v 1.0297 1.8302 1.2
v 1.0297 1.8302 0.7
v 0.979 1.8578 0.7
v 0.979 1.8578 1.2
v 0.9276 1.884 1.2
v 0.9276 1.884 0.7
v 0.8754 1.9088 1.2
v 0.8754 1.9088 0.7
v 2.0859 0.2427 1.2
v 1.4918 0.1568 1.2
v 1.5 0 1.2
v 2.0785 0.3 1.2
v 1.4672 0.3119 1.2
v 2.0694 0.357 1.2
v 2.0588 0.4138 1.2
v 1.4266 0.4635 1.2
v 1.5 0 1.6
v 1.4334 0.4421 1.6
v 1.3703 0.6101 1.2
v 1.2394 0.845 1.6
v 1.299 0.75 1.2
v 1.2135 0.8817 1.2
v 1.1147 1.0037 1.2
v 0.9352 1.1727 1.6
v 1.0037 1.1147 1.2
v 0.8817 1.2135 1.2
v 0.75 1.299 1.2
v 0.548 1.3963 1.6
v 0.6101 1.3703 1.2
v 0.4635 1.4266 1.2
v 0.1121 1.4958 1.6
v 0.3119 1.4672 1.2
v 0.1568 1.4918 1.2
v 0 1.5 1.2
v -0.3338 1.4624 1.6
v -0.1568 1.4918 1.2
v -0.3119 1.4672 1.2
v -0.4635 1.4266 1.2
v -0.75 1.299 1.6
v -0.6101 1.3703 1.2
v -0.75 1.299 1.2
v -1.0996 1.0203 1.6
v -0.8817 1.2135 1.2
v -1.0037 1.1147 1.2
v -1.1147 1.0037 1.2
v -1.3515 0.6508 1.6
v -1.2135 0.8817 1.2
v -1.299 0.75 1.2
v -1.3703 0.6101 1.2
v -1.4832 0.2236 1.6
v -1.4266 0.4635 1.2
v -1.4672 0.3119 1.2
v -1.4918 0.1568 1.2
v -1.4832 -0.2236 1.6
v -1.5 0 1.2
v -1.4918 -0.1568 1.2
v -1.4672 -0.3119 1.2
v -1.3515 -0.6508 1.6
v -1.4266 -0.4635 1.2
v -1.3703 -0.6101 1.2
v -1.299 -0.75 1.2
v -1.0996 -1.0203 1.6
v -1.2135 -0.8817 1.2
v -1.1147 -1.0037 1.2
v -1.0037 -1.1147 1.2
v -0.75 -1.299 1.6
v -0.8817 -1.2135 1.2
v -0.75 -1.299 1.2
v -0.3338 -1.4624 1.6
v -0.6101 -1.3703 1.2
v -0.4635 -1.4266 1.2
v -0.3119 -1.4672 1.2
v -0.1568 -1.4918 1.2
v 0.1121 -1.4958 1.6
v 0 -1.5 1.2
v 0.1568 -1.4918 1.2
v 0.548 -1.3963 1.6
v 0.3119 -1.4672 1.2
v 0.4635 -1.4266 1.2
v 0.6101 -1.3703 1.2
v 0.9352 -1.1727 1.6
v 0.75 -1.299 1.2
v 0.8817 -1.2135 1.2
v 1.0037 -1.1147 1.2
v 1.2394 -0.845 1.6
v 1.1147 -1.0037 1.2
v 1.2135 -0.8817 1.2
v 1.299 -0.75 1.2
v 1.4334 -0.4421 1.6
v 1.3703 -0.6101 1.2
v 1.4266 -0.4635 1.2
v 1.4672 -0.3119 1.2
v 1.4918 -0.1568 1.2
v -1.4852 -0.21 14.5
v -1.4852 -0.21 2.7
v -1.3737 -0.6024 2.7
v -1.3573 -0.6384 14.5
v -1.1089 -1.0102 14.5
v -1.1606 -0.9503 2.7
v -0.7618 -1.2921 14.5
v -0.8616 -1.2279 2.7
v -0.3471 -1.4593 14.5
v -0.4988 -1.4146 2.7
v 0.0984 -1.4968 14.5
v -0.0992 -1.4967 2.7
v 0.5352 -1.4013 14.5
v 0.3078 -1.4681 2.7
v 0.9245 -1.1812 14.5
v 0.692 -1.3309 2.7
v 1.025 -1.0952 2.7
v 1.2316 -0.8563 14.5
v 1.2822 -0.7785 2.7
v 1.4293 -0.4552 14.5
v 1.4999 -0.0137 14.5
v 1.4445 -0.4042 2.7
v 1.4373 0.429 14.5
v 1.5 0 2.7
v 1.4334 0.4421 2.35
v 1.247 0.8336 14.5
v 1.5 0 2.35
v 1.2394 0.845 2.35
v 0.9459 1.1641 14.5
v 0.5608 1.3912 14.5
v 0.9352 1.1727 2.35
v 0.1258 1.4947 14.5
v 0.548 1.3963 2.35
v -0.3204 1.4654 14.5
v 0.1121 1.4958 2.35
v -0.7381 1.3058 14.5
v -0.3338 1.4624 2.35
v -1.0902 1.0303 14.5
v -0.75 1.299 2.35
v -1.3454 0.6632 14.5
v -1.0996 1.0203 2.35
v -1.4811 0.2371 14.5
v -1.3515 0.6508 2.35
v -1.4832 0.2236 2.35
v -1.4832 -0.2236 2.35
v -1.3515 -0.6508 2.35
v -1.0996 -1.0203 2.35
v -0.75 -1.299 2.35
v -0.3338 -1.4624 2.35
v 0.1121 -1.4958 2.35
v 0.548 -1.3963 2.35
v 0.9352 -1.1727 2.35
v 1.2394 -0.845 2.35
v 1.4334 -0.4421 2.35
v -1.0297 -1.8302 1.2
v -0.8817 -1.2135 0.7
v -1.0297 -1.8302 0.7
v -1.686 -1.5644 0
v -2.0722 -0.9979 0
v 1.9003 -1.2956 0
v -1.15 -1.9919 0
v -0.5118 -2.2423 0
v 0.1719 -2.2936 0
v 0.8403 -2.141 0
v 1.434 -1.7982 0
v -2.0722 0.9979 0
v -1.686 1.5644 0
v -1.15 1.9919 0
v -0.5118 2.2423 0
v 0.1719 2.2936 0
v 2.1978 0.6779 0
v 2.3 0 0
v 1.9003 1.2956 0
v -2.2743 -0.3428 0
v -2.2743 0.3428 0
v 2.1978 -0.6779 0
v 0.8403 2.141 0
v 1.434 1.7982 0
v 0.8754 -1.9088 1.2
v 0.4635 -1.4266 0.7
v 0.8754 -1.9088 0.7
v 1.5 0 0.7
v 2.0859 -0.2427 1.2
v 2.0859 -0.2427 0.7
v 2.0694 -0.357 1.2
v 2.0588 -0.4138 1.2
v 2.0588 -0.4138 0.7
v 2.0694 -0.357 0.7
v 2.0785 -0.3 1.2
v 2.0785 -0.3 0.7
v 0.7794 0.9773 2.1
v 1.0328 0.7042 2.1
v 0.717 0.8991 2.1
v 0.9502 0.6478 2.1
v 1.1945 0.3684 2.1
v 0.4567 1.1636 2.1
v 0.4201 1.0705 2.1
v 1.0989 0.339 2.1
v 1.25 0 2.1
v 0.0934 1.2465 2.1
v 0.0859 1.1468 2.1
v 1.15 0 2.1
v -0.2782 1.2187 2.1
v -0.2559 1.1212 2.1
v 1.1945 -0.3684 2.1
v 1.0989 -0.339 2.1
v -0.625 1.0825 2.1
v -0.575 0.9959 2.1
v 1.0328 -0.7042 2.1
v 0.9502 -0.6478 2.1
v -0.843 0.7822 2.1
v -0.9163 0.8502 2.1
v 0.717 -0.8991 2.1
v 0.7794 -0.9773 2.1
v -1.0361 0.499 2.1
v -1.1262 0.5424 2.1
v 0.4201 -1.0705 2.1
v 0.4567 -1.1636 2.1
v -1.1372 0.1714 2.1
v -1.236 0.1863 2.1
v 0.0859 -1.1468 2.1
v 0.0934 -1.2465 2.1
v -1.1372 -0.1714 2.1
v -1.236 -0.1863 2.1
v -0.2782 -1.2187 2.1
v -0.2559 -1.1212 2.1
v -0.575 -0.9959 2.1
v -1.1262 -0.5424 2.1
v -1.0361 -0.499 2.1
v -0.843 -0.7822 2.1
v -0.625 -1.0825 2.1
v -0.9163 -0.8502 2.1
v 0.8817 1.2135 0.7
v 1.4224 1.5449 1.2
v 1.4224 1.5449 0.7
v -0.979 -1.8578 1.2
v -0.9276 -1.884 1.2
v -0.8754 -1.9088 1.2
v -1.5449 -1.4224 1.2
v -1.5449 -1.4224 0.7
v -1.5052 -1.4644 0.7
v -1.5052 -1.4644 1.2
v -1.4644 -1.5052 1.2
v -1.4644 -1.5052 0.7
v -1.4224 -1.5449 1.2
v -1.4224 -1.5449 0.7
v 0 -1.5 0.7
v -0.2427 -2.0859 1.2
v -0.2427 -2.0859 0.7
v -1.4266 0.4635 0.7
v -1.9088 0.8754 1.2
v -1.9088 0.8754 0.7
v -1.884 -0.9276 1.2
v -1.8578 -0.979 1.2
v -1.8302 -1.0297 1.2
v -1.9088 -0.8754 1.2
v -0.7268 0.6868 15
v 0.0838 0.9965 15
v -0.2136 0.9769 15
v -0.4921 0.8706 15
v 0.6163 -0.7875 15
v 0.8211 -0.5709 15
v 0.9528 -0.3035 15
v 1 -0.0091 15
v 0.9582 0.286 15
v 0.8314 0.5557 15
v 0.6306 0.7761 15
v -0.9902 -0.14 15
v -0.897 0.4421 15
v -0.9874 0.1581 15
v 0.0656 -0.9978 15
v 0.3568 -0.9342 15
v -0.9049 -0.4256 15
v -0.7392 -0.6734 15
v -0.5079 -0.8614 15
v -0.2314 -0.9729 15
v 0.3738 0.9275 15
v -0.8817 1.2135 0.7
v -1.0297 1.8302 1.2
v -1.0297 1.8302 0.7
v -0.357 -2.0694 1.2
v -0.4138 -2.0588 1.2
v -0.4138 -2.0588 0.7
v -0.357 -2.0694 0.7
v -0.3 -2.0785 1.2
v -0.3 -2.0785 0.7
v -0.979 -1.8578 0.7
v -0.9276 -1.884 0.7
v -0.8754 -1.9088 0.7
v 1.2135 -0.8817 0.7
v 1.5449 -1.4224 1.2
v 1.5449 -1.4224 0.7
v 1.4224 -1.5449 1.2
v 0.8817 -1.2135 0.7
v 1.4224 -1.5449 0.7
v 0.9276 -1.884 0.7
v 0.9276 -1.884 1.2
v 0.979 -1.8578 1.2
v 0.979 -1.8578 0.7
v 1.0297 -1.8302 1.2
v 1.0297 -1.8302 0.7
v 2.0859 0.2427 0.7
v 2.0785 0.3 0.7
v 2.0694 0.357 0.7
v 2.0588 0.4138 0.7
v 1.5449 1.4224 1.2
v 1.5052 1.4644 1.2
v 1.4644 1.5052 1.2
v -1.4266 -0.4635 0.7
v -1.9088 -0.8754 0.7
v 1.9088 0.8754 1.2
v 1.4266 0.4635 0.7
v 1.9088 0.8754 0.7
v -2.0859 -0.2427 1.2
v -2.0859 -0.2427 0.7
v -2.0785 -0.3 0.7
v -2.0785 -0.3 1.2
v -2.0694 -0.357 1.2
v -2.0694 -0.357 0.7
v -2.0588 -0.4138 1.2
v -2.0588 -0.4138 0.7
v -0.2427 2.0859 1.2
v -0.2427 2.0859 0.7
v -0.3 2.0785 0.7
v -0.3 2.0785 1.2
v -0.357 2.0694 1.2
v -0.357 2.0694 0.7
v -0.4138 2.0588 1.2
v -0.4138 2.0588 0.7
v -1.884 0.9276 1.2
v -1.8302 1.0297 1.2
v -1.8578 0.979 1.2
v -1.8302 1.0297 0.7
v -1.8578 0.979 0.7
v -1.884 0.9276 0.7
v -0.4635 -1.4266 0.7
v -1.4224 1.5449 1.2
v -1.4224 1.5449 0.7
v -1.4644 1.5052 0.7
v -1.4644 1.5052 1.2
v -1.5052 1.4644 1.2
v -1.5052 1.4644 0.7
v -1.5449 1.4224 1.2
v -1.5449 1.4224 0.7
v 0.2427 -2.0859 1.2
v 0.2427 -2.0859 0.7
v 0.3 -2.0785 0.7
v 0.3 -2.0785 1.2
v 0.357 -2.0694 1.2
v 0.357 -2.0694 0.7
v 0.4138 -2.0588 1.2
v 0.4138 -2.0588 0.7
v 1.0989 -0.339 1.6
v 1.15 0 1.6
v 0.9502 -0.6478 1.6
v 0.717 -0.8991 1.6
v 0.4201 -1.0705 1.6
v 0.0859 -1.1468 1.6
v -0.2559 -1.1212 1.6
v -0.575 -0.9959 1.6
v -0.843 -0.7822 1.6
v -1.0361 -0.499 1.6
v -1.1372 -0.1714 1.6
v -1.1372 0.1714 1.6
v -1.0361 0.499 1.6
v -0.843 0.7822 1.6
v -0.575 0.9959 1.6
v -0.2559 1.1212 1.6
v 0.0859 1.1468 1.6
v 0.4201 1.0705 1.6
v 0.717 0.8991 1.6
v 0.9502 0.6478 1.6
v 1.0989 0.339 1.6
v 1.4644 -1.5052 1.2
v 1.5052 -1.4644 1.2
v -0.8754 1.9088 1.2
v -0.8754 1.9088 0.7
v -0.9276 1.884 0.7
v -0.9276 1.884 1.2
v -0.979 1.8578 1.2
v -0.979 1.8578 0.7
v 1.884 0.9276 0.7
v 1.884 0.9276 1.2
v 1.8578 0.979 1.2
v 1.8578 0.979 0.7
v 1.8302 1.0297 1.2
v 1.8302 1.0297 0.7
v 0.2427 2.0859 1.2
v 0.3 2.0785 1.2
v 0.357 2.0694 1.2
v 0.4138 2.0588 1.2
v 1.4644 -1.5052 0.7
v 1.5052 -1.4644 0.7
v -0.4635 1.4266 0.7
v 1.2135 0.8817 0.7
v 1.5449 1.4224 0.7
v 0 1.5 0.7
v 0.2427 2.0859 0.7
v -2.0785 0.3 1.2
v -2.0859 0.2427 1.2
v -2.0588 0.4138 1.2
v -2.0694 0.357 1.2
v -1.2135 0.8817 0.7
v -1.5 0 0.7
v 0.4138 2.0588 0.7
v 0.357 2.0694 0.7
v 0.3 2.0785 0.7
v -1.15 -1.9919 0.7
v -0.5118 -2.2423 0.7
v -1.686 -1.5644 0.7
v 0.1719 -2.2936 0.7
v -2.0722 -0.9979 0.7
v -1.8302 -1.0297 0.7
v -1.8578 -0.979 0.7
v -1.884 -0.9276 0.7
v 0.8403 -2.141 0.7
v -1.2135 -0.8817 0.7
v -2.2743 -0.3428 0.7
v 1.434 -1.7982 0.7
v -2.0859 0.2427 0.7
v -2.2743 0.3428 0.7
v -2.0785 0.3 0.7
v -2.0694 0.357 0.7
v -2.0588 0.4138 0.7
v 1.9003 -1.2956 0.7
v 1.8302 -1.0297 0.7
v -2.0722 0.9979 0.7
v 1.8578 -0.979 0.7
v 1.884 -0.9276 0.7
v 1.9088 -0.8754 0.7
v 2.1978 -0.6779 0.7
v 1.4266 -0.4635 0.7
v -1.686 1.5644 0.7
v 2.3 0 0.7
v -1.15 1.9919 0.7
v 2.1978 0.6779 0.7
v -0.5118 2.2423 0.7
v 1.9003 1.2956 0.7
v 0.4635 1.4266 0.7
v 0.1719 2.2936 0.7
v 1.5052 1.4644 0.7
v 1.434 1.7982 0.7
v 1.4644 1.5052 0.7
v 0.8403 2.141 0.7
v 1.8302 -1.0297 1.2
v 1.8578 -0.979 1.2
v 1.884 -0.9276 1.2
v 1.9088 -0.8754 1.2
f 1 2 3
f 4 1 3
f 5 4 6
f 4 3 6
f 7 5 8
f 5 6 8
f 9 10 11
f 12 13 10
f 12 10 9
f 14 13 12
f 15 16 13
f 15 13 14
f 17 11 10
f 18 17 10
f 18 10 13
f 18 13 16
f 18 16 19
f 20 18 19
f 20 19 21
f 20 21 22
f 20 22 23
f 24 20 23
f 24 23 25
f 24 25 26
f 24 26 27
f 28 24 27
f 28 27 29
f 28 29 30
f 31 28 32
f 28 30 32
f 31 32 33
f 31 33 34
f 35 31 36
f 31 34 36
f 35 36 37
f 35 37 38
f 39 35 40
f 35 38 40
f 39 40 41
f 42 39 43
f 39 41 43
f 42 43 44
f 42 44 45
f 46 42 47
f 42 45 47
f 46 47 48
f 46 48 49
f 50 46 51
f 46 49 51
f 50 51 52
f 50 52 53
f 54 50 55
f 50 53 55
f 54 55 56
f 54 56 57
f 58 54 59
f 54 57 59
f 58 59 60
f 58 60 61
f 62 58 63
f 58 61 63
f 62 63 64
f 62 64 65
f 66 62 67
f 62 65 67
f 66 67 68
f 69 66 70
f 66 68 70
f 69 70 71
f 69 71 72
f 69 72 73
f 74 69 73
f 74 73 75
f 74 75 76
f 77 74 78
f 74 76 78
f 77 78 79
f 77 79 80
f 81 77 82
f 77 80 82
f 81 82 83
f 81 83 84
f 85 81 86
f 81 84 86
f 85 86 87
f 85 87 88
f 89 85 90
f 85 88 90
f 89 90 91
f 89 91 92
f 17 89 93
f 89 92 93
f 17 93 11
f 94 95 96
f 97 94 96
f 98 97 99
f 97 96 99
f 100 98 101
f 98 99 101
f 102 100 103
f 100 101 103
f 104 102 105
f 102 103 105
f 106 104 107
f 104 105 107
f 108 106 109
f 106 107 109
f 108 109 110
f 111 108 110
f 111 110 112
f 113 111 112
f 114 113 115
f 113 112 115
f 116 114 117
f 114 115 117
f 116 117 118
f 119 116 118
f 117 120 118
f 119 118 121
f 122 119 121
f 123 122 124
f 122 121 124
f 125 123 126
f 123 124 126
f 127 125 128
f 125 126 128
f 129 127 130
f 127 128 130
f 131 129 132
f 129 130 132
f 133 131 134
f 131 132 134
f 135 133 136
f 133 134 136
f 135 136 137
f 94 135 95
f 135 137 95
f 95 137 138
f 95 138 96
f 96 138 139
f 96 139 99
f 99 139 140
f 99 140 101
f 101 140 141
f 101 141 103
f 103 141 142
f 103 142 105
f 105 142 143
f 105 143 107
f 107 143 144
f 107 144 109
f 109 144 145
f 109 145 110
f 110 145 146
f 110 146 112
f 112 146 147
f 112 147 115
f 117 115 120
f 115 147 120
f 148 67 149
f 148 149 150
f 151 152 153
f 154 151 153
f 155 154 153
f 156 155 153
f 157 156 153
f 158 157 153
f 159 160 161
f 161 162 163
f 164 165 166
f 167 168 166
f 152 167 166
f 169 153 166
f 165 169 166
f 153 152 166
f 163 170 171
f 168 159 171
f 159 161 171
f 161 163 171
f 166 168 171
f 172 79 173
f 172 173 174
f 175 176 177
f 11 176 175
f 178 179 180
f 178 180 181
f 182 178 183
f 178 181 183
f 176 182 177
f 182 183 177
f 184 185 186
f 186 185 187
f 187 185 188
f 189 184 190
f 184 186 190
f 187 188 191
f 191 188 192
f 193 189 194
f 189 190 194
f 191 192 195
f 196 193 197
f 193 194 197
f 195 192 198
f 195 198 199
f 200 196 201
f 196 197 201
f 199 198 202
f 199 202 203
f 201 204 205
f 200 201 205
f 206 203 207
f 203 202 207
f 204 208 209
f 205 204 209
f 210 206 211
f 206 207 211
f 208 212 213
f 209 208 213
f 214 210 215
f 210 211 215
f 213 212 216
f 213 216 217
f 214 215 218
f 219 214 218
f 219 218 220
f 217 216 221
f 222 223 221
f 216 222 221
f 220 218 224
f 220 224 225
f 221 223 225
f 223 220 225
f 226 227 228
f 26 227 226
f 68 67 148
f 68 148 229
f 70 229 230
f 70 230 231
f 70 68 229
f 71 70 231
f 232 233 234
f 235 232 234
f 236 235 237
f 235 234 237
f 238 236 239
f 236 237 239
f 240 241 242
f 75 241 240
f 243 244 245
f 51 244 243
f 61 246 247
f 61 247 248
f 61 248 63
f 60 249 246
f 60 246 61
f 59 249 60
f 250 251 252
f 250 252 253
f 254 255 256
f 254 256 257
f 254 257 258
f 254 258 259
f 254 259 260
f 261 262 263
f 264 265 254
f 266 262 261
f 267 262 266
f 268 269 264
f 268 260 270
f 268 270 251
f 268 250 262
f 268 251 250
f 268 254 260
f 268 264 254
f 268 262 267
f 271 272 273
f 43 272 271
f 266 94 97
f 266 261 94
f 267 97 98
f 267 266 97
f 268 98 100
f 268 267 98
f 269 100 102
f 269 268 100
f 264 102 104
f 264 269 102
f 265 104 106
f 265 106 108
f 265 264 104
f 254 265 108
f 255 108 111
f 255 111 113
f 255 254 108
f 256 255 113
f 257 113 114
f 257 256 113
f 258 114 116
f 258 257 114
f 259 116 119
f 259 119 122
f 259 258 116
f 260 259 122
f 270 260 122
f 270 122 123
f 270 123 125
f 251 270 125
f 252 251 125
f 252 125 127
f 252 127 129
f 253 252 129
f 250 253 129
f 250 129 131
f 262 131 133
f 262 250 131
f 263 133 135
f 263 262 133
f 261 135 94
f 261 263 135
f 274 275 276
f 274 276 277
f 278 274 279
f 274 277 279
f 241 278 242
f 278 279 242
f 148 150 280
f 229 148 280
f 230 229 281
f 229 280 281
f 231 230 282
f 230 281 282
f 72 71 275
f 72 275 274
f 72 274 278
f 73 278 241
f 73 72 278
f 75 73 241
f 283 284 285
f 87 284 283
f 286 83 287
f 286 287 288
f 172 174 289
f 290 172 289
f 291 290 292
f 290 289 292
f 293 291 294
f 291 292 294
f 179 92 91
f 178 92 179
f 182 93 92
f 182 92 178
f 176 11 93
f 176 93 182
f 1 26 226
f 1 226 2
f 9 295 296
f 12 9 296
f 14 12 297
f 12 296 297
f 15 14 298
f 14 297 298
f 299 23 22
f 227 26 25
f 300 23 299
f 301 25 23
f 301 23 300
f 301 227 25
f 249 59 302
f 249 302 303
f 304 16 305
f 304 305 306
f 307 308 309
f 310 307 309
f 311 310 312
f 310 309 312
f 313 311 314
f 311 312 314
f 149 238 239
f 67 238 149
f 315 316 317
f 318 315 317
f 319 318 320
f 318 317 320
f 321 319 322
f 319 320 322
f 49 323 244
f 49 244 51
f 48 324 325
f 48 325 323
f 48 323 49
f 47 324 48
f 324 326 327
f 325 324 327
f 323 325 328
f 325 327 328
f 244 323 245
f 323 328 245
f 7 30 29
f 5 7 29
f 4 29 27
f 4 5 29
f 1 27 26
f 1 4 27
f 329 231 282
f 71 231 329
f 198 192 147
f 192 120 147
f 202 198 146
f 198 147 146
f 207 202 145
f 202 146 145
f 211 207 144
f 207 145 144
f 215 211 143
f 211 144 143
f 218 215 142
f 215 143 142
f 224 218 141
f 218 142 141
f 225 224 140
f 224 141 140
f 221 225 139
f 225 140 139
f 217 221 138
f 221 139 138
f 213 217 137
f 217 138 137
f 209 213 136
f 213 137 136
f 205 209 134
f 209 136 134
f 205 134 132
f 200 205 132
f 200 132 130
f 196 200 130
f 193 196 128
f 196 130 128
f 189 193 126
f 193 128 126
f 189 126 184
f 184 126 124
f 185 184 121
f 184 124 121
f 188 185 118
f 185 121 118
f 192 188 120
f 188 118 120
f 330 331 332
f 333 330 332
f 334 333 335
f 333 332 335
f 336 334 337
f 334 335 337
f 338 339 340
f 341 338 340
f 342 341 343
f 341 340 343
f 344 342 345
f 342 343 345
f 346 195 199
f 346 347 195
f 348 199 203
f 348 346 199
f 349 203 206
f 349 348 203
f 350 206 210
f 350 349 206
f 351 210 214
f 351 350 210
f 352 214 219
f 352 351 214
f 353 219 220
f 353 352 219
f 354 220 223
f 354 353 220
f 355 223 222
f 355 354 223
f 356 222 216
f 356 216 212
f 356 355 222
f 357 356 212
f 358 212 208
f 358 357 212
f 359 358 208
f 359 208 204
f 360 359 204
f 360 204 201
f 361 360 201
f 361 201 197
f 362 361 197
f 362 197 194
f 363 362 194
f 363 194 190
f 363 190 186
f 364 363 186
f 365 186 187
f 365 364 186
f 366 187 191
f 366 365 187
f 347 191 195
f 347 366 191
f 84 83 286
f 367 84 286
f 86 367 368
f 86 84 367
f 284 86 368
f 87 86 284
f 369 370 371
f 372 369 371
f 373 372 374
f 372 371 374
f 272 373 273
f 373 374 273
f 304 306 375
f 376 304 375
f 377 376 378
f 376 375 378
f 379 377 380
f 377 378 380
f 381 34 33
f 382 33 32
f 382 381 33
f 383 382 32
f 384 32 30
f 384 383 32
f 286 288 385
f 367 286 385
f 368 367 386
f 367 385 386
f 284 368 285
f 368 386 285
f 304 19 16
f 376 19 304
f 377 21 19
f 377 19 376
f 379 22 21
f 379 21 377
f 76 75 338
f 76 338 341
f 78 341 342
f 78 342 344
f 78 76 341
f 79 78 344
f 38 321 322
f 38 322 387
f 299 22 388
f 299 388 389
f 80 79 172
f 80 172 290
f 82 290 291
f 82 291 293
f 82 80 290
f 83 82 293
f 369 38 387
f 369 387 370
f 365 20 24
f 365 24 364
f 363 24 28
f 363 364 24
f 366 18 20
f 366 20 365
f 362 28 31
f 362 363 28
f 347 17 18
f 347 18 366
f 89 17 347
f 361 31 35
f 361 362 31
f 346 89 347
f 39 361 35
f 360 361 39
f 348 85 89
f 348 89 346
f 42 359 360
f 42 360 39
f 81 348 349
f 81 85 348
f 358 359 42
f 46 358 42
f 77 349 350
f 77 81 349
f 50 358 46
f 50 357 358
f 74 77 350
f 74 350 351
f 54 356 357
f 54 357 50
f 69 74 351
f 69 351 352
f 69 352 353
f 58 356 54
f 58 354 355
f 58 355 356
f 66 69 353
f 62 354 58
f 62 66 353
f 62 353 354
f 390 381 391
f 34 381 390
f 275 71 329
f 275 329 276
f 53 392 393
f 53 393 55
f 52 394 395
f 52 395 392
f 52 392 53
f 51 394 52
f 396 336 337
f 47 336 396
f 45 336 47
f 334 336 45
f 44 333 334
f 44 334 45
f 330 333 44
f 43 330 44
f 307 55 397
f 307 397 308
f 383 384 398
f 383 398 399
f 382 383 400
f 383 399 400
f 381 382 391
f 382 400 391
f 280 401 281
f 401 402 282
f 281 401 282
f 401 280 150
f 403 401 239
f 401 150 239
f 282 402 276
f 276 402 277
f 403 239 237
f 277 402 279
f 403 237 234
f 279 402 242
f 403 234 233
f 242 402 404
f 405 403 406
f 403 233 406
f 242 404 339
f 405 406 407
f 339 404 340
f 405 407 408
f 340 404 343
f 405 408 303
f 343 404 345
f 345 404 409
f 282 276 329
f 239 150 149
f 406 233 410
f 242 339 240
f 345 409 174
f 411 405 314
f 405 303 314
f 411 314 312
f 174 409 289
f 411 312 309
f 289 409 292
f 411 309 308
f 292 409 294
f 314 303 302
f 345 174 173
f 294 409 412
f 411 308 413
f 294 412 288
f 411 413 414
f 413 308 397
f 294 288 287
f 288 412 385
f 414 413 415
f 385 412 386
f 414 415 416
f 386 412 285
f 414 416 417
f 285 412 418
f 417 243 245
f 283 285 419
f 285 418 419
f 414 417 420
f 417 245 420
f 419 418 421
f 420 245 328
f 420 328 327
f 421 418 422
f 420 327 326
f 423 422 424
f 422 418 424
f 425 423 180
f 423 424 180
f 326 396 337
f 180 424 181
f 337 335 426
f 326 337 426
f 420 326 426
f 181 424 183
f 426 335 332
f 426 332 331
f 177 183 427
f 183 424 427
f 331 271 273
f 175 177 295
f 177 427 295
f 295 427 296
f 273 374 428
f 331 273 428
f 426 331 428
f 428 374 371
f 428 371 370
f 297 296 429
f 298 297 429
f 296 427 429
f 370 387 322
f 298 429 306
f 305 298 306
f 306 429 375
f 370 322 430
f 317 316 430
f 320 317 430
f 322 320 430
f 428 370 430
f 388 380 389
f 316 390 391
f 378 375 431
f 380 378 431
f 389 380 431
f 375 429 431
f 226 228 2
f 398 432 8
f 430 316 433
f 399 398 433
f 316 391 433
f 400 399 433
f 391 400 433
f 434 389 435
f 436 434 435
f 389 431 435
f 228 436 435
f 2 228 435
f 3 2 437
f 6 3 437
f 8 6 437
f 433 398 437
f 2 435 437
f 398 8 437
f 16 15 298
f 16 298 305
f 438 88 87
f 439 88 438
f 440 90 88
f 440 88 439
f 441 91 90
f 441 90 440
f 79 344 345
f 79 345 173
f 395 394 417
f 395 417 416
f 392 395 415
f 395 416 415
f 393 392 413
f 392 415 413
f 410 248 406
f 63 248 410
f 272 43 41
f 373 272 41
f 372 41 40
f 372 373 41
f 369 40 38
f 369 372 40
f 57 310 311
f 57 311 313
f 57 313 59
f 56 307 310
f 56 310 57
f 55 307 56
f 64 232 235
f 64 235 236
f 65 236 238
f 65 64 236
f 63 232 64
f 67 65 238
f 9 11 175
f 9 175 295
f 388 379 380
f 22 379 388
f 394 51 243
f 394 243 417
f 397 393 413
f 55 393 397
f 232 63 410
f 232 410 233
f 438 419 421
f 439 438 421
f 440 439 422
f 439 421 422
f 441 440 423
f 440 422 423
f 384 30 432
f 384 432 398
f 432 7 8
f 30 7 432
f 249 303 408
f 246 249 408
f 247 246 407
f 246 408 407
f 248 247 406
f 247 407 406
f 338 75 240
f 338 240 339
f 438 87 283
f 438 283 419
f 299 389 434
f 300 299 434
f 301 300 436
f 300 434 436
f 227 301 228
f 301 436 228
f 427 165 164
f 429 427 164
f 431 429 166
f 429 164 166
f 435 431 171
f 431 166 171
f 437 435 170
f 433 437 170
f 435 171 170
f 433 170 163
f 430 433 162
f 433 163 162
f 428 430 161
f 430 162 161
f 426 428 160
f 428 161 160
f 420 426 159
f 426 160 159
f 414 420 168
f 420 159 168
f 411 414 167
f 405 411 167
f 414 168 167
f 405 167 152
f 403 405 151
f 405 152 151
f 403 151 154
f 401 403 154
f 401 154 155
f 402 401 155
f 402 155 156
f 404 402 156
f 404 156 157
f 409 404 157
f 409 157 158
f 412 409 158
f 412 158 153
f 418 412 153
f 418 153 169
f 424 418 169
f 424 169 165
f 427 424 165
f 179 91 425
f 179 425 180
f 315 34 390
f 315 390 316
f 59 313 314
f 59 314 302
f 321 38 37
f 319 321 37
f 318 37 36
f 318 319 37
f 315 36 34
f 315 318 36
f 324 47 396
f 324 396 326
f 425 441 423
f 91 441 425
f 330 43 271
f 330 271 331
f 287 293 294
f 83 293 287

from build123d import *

# Parameters (mm, degrees)
SKETCH_1_R               = 2.3
EXTRUDE_1_DEPTH          = 1.2
SKETCH_2_R               = 1.4999999999999996
EXTRUDE_2_DEPTH          = 1.5
CUT_EXTRUDE_1_DEPTH      = 0.5
PATTERN_CIRCULAR_1_COUNT = 20
SKETCH_4_W               = 0.3500000000000001
SKETCH_4_H               = 0.49999999999999956
SKETCH_6_W               = 12.300000000000002
SKETCH_6_H               = 1.5
CHAMFER_2_SIZE           = 0.5
CUT_EXTRUDE_START        = -0.5
SKETCH_7_R               = 2.3
SKETCH_7_R_2             = 2.1
CUT_EXTRUDE_2_DEPTH      = 0.5


with BuildPart() as part:
    # Эскиз1 → Вытянуть1 (new body)
    with BuildSketch(Plane.XY):
        Circle(SKETCH_1_R)
    extrude(amount=EXTRUDE_1_DEPTH)

    # Эскиз2 → Вытянуть2 (add)
    with BuildSketch(Plane.XY.offset(1.2)):
        Circle(SKETCH_2_R)
    extrude(amount=EXTRUDE_2_DEPTH)

    # Эскиз3 → Вырез-Вытянуть1 (cut)
    with BuildSketch(Plane.XY.offset(1.2)):
        Polygon((-0.33137084989847343, 2.3), (0.33137084989847343, 2.3), (0, 1.4999999999999996), align=None)
    cut_extrude_1 = extrude(amount=-CUT_EXTRUDE_1_DEPTH, mode=Mode.SUBTRACT)

    # Круговой массив1: Вырез-Вытянуть1 ×20 about axis
    pattern_circular_1_axis = Axis((0, -4e-17, 0), (0, 0, 1))
    for i in range(1, PATTERN_CIRCULAR_1_COUNT):
        add(cut_extrude_1.rotate(pattern_circular_1_axis, i * 360 / PATTERN_CIRCULAR_1_COUNT), mode=Mode.SUBTRACT)

    # Эскиз4 → Вырез-Повернуть1 (revolve, cut)
    with BuildSketch(Plane(origin=(0, 0, 0), x_dir=(1, 0, 0), z_dir=(0, 1, 0))):
        with Locations((1.325, -1.8500000000000003)):
            Rectangle(SKETCH_4_W, SKETCH_4_H)
    revolve(axis=Axis((0, 0, 10.642619982654564), (0, 0, -1)), mode=Mode.SUBTRACT)

    # Эскиз6 → Повернуть1 (revolve)
    with BuildSketch(Plane(origin=(0, 0, 0), x_dir=(0, 0, -1), z_dir=(1, 0, 0)), mode=Mode.PRIVATE) as revolve_1_sk:
        with Locations((-8.850000000000001, -0.75)):
            Rectangle(SKETCH_6_W, SKETCH_6_H)
    revolve(revolve_1_sk.sketch.rotate(Axis((0, 0, 2.6999999999999997), (0, 0, 1)), 278.047567557), axis=Axis((0, 0, 2.6999999999999997), (0, 0, 1)))

    # Фаска2
    # the kernel refuses this chamfer: 0.5 mm, written as the material it takes off along each edge
    with BuildSketch(Plane(origin=(0, 0, 15.000000000000002), x_dir=(-0.9901521845161062, -0.1399951838385265, 0), z_dir=(-0.1399951838385265, 0.9901521845161062, 0))) as chamfer_2_piece_1:
        Polygon((1.4999999999999996, -CHAMFER_2_SIZE), (1.5000000000000004 - CHAMFER_2_SIZE, -1.78e-15), (1.5000000000000004, 0), align=None)
    revolve(axis=Axis((0, 0, 15.000000000000002), (0, 0, 1)), mode=Mode.SUBTRACT)

    # Эскиз7 → Вырез-Вытянуть2 (cut)
    with BuildSketch(Plane.XY.offset(1.2).offset(CUT_EXTRUDE_START)):
        with Locations(Location((0, 0, 0), (0, 0, 180))):
            Circle(SKETCH_7_R)
        Circle(SKETCH_7_R_2, mode=Mode.SUBTRACT)
    extrude(amount=CUT_EXTRUDE_2_DEPTH, mode=Mode.SUBTRACT)

    # Фаска3
    # the kernel refuses this chamfer: 0.25 mm, written as the material it takes off along each edge
    with BuildSketch(Plane(origin=(0, 0, 2.0999999999999996), x_dir=(1, 0, 0), z_dir=(0, 1, 0))) as chamfer_3_piece_1:
        with BuildLine():
            Line((1.2429289321881345, 0.00707106781186528), (1.507071067811865, -0.2570710678118653))
            Line((1.507071067811865, -0.2570710678118653), (1.512071067811865, -0.2570710678118653))
            ThreePointArc((1.512071067811865, -0.2570710678118653), (1.5049999999999994, -0.12853553390593264), (1.505, 0))
            Line((1.505, 0), (1.5, 0.00499999999999989))
            ThreePointArc((1.5, 0.00499999999999989), (1.3714644660940674, 0.00499999999999989), (1.2429289321881345, 0.01207106781186518))
            Line((1.2429289321881345, 0.01207106781186518), (1.2429289321881345, 0.00707106781186528))
        make_face()
    revolve(axis=Axis((0, 0, 2.0999999999999996), (0, 0, -1)), mode=Mode.SUBTRACT)


solid = part.part
